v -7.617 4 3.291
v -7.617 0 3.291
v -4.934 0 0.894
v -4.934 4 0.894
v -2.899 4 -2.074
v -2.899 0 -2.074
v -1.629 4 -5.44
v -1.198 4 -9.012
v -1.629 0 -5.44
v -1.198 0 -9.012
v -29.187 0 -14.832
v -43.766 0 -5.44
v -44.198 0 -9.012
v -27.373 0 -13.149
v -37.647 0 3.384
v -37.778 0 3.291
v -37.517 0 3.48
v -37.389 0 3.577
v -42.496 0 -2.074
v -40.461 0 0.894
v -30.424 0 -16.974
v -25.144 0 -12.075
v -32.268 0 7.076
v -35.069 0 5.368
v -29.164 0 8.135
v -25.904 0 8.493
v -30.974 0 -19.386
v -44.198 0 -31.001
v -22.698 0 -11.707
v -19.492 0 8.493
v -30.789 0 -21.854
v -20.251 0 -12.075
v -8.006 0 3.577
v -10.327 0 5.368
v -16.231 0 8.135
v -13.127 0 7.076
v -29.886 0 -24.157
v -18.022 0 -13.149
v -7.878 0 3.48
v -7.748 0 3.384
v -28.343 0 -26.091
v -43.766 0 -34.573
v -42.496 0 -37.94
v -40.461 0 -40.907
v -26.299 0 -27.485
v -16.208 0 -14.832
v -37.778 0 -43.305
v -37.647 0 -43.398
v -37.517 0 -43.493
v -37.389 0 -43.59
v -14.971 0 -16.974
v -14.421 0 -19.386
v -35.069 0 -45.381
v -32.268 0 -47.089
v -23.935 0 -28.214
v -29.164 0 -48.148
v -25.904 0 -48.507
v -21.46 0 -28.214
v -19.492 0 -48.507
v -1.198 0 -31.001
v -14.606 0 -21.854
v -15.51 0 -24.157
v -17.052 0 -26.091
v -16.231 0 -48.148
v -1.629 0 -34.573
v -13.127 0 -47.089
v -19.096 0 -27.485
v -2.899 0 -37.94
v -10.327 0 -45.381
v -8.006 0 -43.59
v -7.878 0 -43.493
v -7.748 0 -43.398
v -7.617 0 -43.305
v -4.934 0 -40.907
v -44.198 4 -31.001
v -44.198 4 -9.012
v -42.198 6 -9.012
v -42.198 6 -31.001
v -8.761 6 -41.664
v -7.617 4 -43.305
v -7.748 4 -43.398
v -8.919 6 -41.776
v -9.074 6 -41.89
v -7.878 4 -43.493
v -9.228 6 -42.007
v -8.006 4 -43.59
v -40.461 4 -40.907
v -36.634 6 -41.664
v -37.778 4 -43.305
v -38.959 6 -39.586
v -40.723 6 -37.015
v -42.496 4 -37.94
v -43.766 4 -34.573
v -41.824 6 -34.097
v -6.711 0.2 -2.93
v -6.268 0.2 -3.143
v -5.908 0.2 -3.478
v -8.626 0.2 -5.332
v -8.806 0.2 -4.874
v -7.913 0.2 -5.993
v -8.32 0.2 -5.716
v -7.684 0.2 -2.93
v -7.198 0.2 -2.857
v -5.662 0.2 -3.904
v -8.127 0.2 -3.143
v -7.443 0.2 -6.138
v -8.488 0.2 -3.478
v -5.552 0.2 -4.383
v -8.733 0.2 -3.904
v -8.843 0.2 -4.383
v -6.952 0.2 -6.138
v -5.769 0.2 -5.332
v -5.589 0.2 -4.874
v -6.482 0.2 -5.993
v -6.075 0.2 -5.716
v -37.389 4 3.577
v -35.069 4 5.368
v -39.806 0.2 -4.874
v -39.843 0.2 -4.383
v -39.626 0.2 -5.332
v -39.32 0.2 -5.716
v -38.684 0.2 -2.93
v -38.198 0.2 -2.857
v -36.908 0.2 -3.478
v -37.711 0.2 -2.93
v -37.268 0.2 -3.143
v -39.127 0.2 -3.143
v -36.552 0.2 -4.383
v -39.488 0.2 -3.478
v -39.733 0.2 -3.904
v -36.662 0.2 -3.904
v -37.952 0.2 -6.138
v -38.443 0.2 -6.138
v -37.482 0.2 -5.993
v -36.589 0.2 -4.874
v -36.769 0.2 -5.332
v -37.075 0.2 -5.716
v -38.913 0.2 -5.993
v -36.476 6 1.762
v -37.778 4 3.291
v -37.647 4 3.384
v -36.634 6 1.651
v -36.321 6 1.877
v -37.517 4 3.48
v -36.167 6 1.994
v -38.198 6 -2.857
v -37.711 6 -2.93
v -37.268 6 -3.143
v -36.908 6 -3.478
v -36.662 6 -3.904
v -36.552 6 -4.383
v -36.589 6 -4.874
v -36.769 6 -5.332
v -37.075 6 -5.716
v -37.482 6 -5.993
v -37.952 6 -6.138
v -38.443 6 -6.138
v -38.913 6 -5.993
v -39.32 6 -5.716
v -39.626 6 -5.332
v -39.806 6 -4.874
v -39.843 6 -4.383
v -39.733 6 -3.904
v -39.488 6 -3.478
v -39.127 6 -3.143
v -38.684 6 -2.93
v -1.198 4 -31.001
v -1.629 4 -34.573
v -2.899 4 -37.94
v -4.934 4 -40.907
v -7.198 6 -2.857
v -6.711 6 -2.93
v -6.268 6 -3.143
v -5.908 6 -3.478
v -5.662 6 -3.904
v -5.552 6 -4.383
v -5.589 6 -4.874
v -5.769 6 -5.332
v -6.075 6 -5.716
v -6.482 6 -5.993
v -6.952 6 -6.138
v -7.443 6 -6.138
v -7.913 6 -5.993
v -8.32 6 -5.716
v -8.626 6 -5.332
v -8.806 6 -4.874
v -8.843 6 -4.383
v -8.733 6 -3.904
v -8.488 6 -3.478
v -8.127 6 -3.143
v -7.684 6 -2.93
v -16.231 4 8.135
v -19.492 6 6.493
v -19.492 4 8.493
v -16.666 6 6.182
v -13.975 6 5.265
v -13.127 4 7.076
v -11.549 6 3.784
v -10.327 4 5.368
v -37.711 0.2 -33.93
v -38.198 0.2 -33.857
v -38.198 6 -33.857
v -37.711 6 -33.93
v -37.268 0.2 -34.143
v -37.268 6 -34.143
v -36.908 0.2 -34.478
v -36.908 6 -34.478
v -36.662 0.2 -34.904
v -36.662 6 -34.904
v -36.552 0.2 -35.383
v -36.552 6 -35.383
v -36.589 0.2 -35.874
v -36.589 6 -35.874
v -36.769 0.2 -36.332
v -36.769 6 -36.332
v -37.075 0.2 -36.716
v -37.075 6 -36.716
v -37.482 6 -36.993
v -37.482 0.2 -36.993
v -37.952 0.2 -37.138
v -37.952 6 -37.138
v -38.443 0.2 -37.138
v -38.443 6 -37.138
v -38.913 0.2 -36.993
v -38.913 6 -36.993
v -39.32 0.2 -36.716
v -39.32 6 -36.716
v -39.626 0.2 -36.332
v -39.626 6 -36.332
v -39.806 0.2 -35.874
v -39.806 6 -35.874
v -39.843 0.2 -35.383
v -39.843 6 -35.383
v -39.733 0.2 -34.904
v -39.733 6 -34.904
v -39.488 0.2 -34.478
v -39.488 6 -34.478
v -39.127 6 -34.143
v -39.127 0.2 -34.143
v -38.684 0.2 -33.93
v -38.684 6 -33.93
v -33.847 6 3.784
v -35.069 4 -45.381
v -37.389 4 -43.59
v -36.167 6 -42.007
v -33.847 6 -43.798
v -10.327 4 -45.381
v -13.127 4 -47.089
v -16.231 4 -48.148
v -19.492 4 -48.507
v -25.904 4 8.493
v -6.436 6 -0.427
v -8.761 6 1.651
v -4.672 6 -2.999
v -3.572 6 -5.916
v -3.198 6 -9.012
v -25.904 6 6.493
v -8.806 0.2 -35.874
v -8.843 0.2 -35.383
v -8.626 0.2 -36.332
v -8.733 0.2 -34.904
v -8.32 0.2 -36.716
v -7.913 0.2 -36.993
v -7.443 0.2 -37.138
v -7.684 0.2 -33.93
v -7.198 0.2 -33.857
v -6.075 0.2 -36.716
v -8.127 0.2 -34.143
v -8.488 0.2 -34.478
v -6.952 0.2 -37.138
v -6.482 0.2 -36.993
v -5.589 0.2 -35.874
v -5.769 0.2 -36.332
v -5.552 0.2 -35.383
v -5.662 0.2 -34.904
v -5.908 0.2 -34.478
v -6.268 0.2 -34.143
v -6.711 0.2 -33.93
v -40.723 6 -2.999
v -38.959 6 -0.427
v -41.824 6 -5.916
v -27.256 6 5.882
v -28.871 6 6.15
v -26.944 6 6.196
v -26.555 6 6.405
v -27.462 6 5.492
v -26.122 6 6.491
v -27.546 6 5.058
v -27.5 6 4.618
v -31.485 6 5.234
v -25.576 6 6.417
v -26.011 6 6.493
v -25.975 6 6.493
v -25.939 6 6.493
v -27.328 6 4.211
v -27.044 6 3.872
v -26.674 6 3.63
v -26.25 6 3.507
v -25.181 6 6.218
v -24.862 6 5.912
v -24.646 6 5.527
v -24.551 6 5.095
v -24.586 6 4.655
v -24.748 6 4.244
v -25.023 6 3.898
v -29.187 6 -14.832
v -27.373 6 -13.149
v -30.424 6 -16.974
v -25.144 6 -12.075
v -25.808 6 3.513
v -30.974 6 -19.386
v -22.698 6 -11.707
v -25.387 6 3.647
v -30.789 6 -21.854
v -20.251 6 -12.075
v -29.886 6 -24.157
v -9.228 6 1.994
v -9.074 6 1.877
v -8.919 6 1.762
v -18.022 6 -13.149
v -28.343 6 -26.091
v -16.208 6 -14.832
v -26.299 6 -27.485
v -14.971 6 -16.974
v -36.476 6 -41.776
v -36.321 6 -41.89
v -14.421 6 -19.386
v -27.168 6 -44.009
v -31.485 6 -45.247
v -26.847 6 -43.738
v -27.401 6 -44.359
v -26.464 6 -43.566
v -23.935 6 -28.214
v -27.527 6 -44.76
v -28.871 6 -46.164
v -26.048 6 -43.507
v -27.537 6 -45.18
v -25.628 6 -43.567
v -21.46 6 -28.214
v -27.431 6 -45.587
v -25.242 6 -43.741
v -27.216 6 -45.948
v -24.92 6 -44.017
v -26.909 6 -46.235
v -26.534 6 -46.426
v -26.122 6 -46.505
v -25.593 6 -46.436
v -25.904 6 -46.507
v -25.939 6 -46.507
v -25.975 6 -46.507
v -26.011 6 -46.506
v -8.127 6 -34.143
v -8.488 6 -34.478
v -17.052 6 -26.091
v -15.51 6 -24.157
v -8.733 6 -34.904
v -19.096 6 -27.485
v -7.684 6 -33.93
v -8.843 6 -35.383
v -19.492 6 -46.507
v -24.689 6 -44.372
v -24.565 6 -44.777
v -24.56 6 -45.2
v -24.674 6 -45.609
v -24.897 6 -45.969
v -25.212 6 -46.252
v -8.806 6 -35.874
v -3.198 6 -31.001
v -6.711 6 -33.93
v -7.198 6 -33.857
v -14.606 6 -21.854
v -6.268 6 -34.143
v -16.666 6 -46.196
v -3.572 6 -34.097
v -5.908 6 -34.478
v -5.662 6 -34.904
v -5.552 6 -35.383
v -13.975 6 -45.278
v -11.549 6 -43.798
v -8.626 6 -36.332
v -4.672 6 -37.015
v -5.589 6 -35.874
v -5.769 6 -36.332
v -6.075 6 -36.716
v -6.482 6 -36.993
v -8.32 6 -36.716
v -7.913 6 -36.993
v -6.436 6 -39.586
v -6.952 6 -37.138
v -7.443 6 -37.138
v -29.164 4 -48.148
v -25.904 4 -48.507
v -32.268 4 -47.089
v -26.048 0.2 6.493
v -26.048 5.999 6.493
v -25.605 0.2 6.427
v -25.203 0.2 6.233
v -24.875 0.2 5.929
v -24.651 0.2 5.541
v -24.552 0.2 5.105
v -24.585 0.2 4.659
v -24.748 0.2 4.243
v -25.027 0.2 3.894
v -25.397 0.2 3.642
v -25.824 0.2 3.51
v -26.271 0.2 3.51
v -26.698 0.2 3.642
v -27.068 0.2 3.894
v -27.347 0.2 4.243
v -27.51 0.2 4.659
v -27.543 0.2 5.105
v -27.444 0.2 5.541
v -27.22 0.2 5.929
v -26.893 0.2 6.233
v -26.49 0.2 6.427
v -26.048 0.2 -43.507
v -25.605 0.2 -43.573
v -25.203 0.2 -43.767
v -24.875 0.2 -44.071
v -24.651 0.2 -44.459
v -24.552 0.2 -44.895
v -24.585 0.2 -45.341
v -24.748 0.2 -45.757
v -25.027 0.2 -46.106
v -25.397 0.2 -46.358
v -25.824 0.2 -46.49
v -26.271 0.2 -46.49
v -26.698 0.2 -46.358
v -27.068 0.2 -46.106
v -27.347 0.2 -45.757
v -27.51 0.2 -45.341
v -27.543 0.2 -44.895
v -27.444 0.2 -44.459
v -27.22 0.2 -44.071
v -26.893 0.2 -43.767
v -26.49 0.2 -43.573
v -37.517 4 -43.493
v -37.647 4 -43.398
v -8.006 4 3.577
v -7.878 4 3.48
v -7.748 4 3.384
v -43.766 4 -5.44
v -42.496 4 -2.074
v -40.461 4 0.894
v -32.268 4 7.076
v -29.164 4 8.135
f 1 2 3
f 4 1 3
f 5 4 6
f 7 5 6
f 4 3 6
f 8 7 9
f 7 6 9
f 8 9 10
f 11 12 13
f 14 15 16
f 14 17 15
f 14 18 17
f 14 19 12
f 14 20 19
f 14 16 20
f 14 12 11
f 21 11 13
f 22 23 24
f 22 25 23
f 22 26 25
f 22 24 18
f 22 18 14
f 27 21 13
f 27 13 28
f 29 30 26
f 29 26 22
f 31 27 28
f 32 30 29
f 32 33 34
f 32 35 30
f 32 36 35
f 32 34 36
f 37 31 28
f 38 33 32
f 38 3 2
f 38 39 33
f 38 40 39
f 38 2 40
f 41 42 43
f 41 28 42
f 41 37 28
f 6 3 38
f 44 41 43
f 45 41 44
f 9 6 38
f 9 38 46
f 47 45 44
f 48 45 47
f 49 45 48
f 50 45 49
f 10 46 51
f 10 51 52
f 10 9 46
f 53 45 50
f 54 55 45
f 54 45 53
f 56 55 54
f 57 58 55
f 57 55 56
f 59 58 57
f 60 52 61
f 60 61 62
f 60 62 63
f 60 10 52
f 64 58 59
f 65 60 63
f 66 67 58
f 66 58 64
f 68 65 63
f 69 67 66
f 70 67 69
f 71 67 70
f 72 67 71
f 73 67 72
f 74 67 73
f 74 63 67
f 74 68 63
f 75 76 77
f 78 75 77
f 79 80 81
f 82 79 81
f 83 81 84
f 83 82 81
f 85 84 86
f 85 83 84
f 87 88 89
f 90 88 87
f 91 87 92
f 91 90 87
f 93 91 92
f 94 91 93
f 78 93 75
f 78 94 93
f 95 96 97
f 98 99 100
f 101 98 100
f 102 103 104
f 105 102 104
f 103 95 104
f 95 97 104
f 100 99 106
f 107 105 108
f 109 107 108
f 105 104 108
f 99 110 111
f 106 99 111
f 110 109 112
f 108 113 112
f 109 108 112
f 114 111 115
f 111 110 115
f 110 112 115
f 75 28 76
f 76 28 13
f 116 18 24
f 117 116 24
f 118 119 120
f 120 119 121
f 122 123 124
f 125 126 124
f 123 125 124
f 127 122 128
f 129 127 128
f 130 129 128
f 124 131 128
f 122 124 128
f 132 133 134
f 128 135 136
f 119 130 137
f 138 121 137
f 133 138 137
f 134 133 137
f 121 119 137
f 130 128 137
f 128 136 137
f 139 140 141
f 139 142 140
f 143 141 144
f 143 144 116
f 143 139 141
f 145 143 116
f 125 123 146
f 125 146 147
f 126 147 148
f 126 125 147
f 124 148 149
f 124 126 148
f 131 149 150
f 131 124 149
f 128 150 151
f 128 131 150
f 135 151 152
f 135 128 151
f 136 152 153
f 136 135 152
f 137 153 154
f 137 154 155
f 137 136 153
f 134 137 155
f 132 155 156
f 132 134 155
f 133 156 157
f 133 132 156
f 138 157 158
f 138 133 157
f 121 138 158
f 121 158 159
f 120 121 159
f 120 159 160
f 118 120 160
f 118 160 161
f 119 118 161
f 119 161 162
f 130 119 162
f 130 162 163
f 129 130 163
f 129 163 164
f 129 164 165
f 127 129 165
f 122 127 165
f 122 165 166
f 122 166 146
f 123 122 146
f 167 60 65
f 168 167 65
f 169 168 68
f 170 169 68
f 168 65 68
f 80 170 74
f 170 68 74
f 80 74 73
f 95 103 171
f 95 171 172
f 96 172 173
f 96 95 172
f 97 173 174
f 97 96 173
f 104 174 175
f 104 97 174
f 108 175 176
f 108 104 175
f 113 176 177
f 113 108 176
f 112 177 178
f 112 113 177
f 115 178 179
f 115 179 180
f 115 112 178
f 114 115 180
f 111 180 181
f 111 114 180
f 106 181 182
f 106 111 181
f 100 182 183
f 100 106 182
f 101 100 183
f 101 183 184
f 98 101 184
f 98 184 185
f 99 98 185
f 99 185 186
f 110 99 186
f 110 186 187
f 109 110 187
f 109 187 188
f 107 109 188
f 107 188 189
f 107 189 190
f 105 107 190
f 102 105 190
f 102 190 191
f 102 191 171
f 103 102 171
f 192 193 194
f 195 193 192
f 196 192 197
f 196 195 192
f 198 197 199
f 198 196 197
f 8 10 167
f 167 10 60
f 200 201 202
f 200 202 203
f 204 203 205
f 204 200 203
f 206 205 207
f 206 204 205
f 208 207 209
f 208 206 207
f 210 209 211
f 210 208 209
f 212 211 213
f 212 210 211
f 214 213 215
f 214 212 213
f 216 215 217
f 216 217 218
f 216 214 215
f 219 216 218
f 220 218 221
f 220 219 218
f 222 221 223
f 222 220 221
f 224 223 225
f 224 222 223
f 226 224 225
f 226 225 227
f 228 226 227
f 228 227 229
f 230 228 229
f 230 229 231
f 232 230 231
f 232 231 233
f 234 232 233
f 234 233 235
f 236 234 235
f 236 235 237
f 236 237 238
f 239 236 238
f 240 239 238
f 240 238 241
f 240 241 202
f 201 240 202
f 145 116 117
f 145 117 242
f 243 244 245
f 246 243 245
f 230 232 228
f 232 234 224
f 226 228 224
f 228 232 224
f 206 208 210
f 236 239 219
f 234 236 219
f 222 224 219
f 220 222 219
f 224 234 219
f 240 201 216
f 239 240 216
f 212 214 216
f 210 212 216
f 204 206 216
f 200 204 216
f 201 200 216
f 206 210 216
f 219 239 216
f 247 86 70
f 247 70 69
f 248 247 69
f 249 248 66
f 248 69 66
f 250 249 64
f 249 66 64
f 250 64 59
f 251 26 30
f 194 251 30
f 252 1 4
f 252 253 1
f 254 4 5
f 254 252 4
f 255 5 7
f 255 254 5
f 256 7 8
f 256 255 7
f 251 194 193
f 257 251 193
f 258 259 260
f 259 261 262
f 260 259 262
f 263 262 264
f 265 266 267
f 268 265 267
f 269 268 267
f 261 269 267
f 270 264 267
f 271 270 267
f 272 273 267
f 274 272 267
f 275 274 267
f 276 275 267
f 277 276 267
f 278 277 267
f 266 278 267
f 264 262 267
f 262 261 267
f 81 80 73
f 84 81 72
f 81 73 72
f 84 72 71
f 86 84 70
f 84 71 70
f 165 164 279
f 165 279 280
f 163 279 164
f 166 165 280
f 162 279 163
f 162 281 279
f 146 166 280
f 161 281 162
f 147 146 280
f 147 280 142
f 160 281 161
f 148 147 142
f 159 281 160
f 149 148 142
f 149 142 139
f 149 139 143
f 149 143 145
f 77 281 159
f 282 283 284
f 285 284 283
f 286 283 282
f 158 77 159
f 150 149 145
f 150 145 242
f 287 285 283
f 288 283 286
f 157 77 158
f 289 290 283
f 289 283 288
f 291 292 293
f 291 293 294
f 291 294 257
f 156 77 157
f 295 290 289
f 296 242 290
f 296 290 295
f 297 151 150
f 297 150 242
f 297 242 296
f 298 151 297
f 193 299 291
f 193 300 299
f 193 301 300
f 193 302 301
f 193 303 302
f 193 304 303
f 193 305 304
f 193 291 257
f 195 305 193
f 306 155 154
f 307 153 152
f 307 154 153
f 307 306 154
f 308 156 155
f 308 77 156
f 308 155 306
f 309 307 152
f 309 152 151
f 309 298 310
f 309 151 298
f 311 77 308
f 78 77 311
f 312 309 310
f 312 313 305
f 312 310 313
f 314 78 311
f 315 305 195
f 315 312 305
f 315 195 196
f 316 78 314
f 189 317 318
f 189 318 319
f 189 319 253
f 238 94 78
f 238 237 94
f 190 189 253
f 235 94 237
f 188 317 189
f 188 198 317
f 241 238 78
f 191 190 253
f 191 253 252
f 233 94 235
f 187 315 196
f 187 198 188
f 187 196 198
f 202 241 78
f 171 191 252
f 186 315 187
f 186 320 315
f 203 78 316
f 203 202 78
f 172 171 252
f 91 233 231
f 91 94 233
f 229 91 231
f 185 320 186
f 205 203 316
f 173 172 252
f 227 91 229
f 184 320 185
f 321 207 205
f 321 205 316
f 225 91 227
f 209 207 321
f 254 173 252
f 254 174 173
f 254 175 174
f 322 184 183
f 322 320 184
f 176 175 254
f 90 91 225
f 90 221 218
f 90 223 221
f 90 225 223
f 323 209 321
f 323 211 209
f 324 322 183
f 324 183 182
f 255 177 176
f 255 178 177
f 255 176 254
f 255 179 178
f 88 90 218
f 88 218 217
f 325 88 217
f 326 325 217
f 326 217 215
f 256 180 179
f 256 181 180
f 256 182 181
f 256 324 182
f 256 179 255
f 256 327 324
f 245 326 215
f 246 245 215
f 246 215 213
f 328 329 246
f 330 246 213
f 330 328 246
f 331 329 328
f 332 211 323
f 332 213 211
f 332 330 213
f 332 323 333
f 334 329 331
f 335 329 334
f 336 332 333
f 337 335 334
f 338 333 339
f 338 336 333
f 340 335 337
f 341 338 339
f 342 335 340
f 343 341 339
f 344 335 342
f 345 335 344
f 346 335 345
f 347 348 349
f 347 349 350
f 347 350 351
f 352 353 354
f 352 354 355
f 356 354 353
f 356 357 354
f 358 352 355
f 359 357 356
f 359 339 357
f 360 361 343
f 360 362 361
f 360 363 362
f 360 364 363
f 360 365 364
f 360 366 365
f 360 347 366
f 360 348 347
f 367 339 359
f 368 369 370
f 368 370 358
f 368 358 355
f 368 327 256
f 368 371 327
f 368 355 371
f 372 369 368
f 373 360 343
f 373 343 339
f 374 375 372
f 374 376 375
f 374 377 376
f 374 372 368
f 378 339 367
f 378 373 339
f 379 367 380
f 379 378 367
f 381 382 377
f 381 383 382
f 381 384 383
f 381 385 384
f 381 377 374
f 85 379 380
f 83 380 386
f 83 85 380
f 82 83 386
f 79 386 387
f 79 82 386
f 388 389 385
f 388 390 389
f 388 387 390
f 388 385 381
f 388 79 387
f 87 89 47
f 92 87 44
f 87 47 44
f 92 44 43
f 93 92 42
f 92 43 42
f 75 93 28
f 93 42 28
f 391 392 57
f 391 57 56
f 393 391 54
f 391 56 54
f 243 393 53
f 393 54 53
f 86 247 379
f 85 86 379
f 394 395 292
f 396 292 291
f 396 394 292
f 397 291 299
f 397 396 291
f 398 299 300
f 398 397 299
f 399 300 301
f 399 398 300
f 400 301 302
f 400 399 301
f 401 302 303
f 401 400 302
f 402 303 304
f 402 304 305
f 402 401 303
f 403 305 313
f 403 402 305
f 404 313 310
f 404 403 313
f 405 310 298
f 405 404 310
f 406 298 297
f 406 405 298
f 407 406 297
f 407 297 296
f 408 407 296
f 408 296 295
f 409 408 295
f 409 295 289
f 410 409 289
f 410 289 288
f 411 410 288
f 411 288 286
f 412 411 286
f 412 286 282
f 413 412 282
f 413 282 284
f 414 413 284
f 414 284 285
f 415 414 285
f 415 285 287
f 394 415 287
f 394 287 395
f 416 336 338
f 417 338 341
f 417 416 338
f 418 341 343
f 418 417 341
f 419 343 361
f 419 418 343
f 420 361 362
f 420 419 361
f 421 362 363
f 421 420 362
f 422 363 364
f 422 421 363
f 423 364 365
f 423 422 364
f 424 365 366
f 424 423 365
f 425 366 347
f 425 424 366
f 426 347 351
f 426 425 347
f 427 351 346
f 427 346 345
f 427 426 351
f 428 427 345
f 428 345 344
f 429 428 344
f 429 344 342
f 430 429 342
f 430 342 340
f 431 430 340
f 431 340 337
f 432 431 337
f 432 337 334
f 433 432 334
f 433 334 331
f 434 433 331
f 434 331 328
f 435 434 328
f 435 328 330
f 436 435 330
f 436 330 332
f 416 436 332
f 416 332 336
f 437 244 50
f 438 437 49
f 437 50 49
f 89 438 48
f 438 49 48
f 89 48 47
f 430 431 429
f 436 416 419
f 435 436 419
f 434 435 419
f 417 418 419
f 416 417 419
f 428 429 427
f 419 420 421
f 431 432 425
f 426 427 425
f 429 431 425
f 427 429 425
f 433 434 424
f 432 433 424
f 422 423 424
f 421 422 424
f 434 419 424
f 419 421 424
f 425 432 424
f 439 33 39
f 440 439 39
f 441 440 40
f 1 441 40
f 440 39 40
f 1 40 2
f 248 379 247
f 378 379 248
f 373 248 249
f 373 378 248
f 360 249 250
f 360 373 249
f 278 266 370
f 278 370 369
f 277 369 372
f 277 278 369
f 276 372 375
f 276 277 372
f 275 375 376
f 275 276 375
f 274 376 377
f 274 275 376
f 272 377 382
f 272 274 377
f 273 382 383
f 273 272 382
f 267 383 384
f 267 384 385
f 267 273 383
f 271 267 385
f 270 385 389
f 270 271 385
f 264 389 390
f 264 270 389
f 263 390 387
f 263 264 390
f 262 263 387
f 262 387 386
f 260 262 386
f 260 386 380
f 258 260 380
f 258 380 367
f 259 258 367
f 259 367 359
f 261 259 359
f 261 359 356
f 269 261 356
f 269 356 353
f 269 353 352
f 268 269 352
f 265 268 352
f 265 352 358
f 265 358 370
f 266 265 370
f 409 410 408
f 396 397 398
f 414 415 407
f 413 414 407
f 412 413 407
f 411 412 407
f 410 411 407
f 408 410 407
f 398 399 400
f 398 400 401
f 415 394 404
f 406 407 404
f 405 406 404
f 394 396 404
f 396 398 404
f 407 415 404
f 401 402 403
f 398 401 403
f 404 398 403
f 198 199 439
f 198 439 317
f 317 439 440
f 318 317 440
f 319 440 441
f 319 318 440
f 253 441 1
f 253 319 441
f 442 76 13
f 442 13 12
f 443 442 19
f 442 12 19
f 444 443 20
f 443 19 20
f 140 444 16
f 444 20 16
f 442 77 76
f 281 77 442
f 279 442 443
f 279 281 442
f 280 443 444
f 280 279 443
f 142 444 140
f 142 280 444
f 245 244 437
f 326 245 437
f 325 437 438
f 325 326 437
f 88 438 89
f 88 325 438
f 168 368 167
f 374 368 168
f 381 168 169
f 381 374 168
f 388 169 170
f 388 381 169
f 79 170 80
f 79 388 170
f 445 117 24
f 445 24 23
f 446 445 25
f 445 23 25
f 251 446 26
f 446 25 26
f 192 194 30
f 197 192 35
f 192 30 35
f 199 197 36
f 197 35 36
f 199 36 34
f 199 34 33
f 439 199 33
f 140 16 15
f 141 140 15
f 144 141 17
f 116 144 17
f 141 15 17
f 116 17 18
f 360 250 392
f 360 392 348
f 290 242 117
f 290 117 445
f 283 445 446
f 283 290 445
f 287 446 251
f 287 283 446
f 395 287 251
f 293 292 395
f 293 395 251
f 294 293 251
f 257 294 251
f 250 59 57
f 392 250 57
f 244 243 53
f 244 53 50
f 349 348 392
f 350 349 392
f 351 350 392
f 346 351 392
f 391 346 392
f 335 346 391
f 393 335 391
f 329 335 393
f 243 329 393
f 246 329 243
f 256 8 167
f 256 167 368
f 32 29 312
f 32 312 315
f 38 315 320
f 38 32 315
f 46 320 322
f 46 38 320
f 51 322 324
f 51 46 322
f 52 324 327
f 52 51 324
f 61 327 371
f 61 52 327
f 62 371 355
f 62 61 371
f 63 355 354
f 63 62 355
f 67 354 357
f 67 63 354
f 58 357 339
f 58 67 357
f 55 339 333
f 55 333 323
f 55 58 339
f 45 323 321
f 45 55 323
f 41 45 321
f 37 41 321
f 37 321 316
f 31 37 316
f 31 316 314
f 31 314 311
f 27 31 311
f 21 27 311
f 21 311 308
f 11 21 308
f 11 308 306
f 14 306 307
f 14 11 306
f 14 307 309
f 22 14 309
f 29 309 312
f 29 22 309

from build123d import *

# Parameters (mm, degrees)
SZKIC1_R                    = 1.65
SZKIC1_R_2                  = 1.5
SZKIC1_R_3                  = 8.3
DODANIE_WYCI_GNI_CIE1_DEPTH = 6
SFAZOWANIE1_SIZE            = 2
SZKIC2_R                    = 1.65
SZKIC2_R_2                  = 1.5
DODANIE_WYCI_GNI_CIE2_DEPTH = 0.2


with BuildPart() as part:
    # Szkic1 → Dodanie-wyciągnięcie1 (new body)
    with BuildSketch(Plane(origin=(0, 0, 0), x_dir=(1, 0, 0), z_dir=(0, 1, 0))):
        with BuildLine():
            Line((-25.903523773, -8.493281025), (-19.491546416, -8.493281025))
            ThreePointArc((-19.491546416, -8.493281025), (-14.649908292, -7.690412435), (-10.326563391, -5.367753061))
            Line((-10.326563391, -5.367753061), (-8.006357575, -3.576966334))
            ThreePointArc((-8.006357575, -3.576966334), (-7.813323472, -3.431665275), (-7.616835373, -3.29107015))
            ThreePointArc((-7.616835373, -3.29107015), (-2.898841628, 2.073604214), (-1.197535095, 9.012246163))
            Line((-1.197535095, 9.012246163), (-1.197535095, 31.001191788))
            ThreePointArc((-1.197535095, 31.001191788), (-2.898841628, 37.939833736), (-7.616835373, 43.3045081))
            ThreePointArc((-7.616835373, 43.3045081), (-7.813323472, 43.445103226), (-8.006357575, 43.590404284))
            Line((-8.006357575, 43.590404284), (-10.326563391, 45.381191012))
            ThreePointArc((-10.326563391, 45.381191012), (-14.649908292, 47.703850385), (-19.491546416, 48.506718975))
            Line((-19.491546416, 48.506718975), (-25.903523773, 48.506718975))
            ThreePointArc((-25.903523773, 48.506718975), (-30.745161897, 47.703850385), (-35.068506799, 45.381191012))
            Line((-35.068506799, 45.381191012), (-37.388712614, 43.590404284))
            ThreePointArc((-37.388712614, 43.590404284), (-37.581746717, 43.445103226), (-37.778234817, 43.3045081))
            ThreePointArc((-37.778234817, 43.3045081), (-42.496228561, 37.939833736), (-44.197535095, 31.001191788))
            Line((-44.197535095, 31.001191788), (-44.197535095, 9.012246163))
            ThreePointArc((-44.197535095, 9.012246163), (-42.496228561, 2.073604214), (-37.778234817, -3.29107015))
            ThreePointArc((-37.778234817, -3.29107015), (-37.581746717, -3.431665275), (-37.388712614, -3.576966334))
            Line((-37.388712614, -3.576966334), (-35.068506799, -5.367753061))
            ThreePointArc((-35.068506799, -5.367753061), (-30.745161897, -7.690412435), (-25.903523773, -8.493281025))
        make_face()
        with Locations(Location((-38.197535095, 35.506718975, 0), (0, 0, 270))):
            Circle(SZKIC1_R, mode=Mode.SUBTRACT)
        with Locations(Location((-26.047535095, 45.006718975, 0), (0, 0, 270))):
            Circle(SZKIC1_R_2, mode=Mode.SUBTRACT)
        with Locations(Location((-7.197535095, 35.506718975, 0), (0, 0, 270))):
            Circle(SZKIC1_R, mode=Mode.SUBTRACT)
        with Locations(Location((-38.197535095, 4.506718975, 0), (0, 0, 270))):
            Circle(SZKIC1_R, mode=Mode.SUBTRACT)
        with Locations(Location((-26.047535095, -4.993281025, 0), (0, 0, 270))):
            Circle(SZKIC1_R_2, mode=Mode.SUBTRACT)
        with Locations(Location((-7.197535095, 4.506718975, 0), (0, 0, 270))):
            Circle(SZKIC1_R, mode=Mode.SUBTRACT)
        with Locations(Location((-22.697535095, 20.006718975, 0), (0, 0, 270))):
            Circle(SZKIC1_R_3, mode=Mode.SUBTRACT)
    extrude(amount=DODANIE_WYCI_GNI_CIE1_DEPTH)

    # Sfazowanie1
    # the kernel refuses this chamfer: 2 mm, written as the material it takes off along each edge
    with BuildSketch(Plane(origin=(-19.491546416, 6, -33.506718975), x_dir=(0.6109988683682814, 0, -0.791631469089424), z_dir=(0.791631469089424, 0, 0.6109988683682814))) as sfazowanie1_piece_1:
        Polygon((15, -SFAZOWANIE1_SIZE), (15 - SFAZOWANIE1_SIZE, 0), (15, 0), align=None)
    revolve(axis=Axis((-19.491546416, 6, -33.506718975), (0, 1, 0)), revolution_arc=37.661762745, mode=Mode.SUBTRACT)
    with BuildSketch(Plane(origin=(-19.491546416, 6, -48.506718975), x_dir=(0, -0.9996219169112968, -0.02749587661058563), z_dir=(-1, 0, 0)), Plane(origin=(-25.903523773, 6, 8.493281025), x_dir=(0, -0.9996219169112968, 0.027495876610586487), z_dir=(1, 0, 0))) as sfazowanie1_piece_2:
        Polygon((SFAZOWANIE1_SIZE * 0.999621916911, SFAZOWANIE1_SIZE * 0.0274958766106), (-SFAZOWANIE1_SIZE * 0.0274958766106, SFAZOWANIE1_SIZE * 0.999621916911), (0, 0), align=None)
    extrude(amount=6.411977357, mode=Mode.SUBTRACT)
    with BuildSketch(Plane(origin=(-25.903523773, 6, -33.506718975), x_dir=(0, 0, -1), z_dir=(1, 0, 0))) as sfazowanie1_piece_3:
        Polygon((15, -SFAZOWANIE1_SIZE), (15 - SFAZOWANIE1_SIZE, 0), (15, 0), align=None)
    revolve(axis=Axis((-25.903523773, 6, -33.506718975), (0, 1, 0)), revolution_arc=37.661762745, mode=Mode.SUBTRACT)
    with BuildSketch(Plane(origin=(-35.068506799, 6, -45.381191012), x_dir=(-0.01679994949386156, -0.9996219169112968, -0.021766601195139172), z_dir=(-0.7916314690894233, 0, 0.6109988683682824)), Plane(origin=(-37.388712614, 6, 3.576966334), x_dir=(-0.01679994949386157, -0.9996219169112968, 0.02176660119513917), z_dir=(0.791631469089423, 0, 0.6109988683682828)), Plane(origin=(-10.326563391, 6, 5.367753061), x_dir=(0.016799949493862203, -0.9996219169112968, 0.021766601195140015), z_dir=(0.7916314690894233, 0, -0.6109988683682822)), Plane(origin=(-8.006357575, 6, -43.590404284), x_dir=(0.01679994949386218, -0.9996219169112968, -0.02176660119514003), z_dir=(-0.791631469089424, 0, -0.6109988683682814))) as sfazowanie1_piece_4:
        Polygon((SFAZOWANIE1_SIZE * 0.999621916911, SFAZOWANIE1_SIZE * 0.0274958766106), (-SFAZOWANIE1_SIZE * 0.0274958766106, SFAZOWANIE1_SIZE * 0.999621916911), (0, 0), align=None)
    extrude(amount=2.930916602, mode=Mode.SUBTRACT)
    with BuildSketch(Plane(origin=(-43.498701298, 6, -51.506718975), x_dir=(0.6109988683682784, 0, 0.7916314690894262), z_dir=(0.7916314690894262, 0, -0.6109988683682784))) as sfazowanie1_piece_5:
        Polygon((10, SFAZOWANIE1_SIZE), (10 + SFAZOWANIE1_SIZE, 0), (10, 0), align=None)
    revolve(axis=Axis((-43.498701298, 6, -51.506718975), (0, -1, 0)), revolution_arc=2.76869433, mode=Mode.SUBTRACT)
    with BuildSketch(Plane(origin=(-29.197535095, 6, -31.001191788), x_dir=(-0.5720466481227963, 0, -0.820221087494996), z_dir=(0.820221087494996, 0, -0.5720466481227963))) as sfazowanie1_piece_6:
        Polygon((15, -SFAZOWANIE1_SIZE), (15 - SFAZOWANIE1_SIZE, 0), (15, 0), align=None)
    revolve(axis=Axis((-29.197535095, 6, -31.001191788), (0, 1, 0)), revolution_arc=55.106931585, mode=Mode.SUBTRACT)
    with BuildSketch(Plane(origin=(-44.197535095, 6, -31.001191788), x_dir=(-0.02749587661058563, -0.9996219169112968, 0), z_dir=(0, 0, 1)), Plane(origin=(-1.197535095, 6, -9.012246163), x_dir=(0.027495876610586382, -0.9996219169112968, 0), z_dir=(0, 0, -1))) as sfazowanie1_piece_7:
        Polygon((SFAZOWANIE1_SIZE * 0.999621916911, SFAZOWANIE1_SIZE * 0.0274958766106), (-SFAZOWANIE1_SIZE * 0.0274958766106, SFAZOWANIE1_SIZE * 0.999621916911), (0, 0), align=None)
    extrude(amount=21.988945625, mode=Mode.SUBTRACT)
    with BuildSketch(Plane(origin=(-29.197535095, 6, -9.012246163), x_dir=(-1, 0, 0), z_dir=(0, 0, -1))) as sfazowanie1_piece_8:
        Polygon((15, -SFAZOWANIE1_SIZE), (15 - SFAZOWANIE1_SIZE, 0), (15, 0), align=None)
    revolve(axis=Axis((-29.197535095, 6, -9.012246163), (0, 1, 0)), revolution_arc=55.106931585, mode=Mode.SUBTRACT)
    with BuildSketch(Plane(origin=(-43.498701298, 6, 11.493281025), x_dir=(0.5720466481228126, 0, -0.8202210874949846), z_dir=(-0.8202210874949846, 0, -0.5720466481228126))) as sfazowanie1_piece_9:
        Polygon((10, SFAZOWANIE1_SIZE), (10 + SFAZOWANIE1_SIZE, 0), (10, 0), align=None)
    revolve(axis=Axis((-43.498701298, 6, 11.493281025), (0, -1, 0)), revolution_arc=2.76869433, mode=Mode.SUBTRACT)
    with BuildSketch(Plane(origin=(-25.903523773, 6, -6.506718975), x_dir=(-0.6109988683682754, 0, 0.7916314690894285), z_dir=(-0.7916314690894285, 0, -0.6109988683682754))) as sfazowanie1_piece_10:
        Polygon((15, -SFAZOWANIE1_SIZE), (15 - SFAZOWANIE1_SIZE, 0), (15, 0), align=None)
    revolve(axis=Axis((-25.903523773, 6, -6.506718975), (0, 1, 0)), revolution_arc=37.661762745, mode=Mode.SUBTRACT)
    with BuildSketch(Plane(origin=(-19.491546416, 6, -6.506718975), x_dir=(0, 0, 1), z_dir=(-1, 0, 0))) as sfazowanie1_piece_11:
        Polygon((15, -SFAZOWANIE1_SIZE), (15 - SFAZOWANIE1_SIZE, 0), (15, 0), align=None)
    revolve(axis=Axis((-19.491546416, 6, -6.506718975), (0, 1, 0)), revolution_arc=37.661762745, mode=Mode.SUBTRACT)
    with BuildSketch(Plane(origin=(-1.896368892, 6, 11.493281025), x_dir=(-0.61099886836827, 0, -0.7916314690894327), z_dir=(-0.7916314690894327, 0, 0.61099886836827))) as sfazowanie1_piece_12:
        Polygon((10, SFAZOWANIE1_SIZE), (10 + SFAZOWANIE1_SIZE, 0), (10, 0), align=None)
    revolve(axis=Axis((-1.896368892, 6, 11.493281025), (0, -1, 0)), revolution_arc=2.76869433, mode=Mode.SUBTRACT)
    with BuildSketch(Plane(origin=(-16.197535095, 6, -9.012246163), x_dir=(0.5720466481227972, 0, 0.8202210874949952), z_dir=(-0.8202210874949952, 0, 0.5720466481227972))) as sfazowanie1_piece_13:
        Polygon((15, -SFAZOWANIE1_SIZE), (15 - SFAZOWANIE1_SIZE, 0), (15, 0), align=None)
    revolve(axis=Axis((-16.197535095, 6, -9.012246163), (0, 1, 0)), revolution_arc=55.106931585, mode=Mode.SUBTRACT)
    with BuildSketch(Plane(origin=(-16.197535095, 6, -31.001191788), x_dir=(1, 0, 0), z_dir=(0, 0, 1))) as sfazowanie1_piece_14:
        Polygon((15, -SFAZOWANIE1_SIZE), (15 - SFAZOWANIE1_SIZE, 0), (15, 0), align=None)
    revolve(axis=Axis((-16.197535095, 6, -31.001191788), (0, 1, 0)), revolution_arc=55.106931585, mode=Mode.SUBTRACT)
    with BuildSketch(Plane(origin=(-1.896368892, 6, -51.506718975), x_dir=(-0.5720466481227885, 0, 0.8202210874950013), z_dir=(0.8202210874950013, 0, 0.5720466481227885))) as sfazowanie1_piece_15:
        Polygon((10, SFAZOWANIE1_SIZE), (10 + SFAZOWANIE1_SIZE, 0), (10, 0), align=None)
    revolve(axis=Axis((-1.896368892, 6, -51.506718975), (0, -1, 0)), revolution_arc=2.76869433, mode=Mode.SUBTRACT)

    # Szkic2 → Dodanie-wyciągnięcie2 (add)
    with BuildSketch(Plane.XZ):
        with Locations(Location((-38.197535095, -35.506718975, 0), (0, 0, 270))):
            Circle(SZKIC2_R)
        with Locations(Location((-26.047535095, -45.006718975, 0), (0, 0, 270))):
            Circle(SZKIC2_R_2)
        with Locations(Location((-7.197535095, -35.506718975, 0), (0, 0, 270))):
            Circle(SZKIC2_R)
        with Locations(Location((-7.197535095, -4.506718975, 0), (0, 0, 270))):
            Circle(SZKIC2_R)
        with Locations(Location((-38.197535095, -4.506718975, 0), (0, 0, 270))):
            Circle(SZKIC2_R)
        with Locations(Location((-26.047535095, 4.993281025, 0), (0, 0, 270))):
            Circle(SZKIC2_R_2)
    extrude(amount=-DODANIE_WYCI_GNI_CIE2_DEPTH)


solid = part.part
